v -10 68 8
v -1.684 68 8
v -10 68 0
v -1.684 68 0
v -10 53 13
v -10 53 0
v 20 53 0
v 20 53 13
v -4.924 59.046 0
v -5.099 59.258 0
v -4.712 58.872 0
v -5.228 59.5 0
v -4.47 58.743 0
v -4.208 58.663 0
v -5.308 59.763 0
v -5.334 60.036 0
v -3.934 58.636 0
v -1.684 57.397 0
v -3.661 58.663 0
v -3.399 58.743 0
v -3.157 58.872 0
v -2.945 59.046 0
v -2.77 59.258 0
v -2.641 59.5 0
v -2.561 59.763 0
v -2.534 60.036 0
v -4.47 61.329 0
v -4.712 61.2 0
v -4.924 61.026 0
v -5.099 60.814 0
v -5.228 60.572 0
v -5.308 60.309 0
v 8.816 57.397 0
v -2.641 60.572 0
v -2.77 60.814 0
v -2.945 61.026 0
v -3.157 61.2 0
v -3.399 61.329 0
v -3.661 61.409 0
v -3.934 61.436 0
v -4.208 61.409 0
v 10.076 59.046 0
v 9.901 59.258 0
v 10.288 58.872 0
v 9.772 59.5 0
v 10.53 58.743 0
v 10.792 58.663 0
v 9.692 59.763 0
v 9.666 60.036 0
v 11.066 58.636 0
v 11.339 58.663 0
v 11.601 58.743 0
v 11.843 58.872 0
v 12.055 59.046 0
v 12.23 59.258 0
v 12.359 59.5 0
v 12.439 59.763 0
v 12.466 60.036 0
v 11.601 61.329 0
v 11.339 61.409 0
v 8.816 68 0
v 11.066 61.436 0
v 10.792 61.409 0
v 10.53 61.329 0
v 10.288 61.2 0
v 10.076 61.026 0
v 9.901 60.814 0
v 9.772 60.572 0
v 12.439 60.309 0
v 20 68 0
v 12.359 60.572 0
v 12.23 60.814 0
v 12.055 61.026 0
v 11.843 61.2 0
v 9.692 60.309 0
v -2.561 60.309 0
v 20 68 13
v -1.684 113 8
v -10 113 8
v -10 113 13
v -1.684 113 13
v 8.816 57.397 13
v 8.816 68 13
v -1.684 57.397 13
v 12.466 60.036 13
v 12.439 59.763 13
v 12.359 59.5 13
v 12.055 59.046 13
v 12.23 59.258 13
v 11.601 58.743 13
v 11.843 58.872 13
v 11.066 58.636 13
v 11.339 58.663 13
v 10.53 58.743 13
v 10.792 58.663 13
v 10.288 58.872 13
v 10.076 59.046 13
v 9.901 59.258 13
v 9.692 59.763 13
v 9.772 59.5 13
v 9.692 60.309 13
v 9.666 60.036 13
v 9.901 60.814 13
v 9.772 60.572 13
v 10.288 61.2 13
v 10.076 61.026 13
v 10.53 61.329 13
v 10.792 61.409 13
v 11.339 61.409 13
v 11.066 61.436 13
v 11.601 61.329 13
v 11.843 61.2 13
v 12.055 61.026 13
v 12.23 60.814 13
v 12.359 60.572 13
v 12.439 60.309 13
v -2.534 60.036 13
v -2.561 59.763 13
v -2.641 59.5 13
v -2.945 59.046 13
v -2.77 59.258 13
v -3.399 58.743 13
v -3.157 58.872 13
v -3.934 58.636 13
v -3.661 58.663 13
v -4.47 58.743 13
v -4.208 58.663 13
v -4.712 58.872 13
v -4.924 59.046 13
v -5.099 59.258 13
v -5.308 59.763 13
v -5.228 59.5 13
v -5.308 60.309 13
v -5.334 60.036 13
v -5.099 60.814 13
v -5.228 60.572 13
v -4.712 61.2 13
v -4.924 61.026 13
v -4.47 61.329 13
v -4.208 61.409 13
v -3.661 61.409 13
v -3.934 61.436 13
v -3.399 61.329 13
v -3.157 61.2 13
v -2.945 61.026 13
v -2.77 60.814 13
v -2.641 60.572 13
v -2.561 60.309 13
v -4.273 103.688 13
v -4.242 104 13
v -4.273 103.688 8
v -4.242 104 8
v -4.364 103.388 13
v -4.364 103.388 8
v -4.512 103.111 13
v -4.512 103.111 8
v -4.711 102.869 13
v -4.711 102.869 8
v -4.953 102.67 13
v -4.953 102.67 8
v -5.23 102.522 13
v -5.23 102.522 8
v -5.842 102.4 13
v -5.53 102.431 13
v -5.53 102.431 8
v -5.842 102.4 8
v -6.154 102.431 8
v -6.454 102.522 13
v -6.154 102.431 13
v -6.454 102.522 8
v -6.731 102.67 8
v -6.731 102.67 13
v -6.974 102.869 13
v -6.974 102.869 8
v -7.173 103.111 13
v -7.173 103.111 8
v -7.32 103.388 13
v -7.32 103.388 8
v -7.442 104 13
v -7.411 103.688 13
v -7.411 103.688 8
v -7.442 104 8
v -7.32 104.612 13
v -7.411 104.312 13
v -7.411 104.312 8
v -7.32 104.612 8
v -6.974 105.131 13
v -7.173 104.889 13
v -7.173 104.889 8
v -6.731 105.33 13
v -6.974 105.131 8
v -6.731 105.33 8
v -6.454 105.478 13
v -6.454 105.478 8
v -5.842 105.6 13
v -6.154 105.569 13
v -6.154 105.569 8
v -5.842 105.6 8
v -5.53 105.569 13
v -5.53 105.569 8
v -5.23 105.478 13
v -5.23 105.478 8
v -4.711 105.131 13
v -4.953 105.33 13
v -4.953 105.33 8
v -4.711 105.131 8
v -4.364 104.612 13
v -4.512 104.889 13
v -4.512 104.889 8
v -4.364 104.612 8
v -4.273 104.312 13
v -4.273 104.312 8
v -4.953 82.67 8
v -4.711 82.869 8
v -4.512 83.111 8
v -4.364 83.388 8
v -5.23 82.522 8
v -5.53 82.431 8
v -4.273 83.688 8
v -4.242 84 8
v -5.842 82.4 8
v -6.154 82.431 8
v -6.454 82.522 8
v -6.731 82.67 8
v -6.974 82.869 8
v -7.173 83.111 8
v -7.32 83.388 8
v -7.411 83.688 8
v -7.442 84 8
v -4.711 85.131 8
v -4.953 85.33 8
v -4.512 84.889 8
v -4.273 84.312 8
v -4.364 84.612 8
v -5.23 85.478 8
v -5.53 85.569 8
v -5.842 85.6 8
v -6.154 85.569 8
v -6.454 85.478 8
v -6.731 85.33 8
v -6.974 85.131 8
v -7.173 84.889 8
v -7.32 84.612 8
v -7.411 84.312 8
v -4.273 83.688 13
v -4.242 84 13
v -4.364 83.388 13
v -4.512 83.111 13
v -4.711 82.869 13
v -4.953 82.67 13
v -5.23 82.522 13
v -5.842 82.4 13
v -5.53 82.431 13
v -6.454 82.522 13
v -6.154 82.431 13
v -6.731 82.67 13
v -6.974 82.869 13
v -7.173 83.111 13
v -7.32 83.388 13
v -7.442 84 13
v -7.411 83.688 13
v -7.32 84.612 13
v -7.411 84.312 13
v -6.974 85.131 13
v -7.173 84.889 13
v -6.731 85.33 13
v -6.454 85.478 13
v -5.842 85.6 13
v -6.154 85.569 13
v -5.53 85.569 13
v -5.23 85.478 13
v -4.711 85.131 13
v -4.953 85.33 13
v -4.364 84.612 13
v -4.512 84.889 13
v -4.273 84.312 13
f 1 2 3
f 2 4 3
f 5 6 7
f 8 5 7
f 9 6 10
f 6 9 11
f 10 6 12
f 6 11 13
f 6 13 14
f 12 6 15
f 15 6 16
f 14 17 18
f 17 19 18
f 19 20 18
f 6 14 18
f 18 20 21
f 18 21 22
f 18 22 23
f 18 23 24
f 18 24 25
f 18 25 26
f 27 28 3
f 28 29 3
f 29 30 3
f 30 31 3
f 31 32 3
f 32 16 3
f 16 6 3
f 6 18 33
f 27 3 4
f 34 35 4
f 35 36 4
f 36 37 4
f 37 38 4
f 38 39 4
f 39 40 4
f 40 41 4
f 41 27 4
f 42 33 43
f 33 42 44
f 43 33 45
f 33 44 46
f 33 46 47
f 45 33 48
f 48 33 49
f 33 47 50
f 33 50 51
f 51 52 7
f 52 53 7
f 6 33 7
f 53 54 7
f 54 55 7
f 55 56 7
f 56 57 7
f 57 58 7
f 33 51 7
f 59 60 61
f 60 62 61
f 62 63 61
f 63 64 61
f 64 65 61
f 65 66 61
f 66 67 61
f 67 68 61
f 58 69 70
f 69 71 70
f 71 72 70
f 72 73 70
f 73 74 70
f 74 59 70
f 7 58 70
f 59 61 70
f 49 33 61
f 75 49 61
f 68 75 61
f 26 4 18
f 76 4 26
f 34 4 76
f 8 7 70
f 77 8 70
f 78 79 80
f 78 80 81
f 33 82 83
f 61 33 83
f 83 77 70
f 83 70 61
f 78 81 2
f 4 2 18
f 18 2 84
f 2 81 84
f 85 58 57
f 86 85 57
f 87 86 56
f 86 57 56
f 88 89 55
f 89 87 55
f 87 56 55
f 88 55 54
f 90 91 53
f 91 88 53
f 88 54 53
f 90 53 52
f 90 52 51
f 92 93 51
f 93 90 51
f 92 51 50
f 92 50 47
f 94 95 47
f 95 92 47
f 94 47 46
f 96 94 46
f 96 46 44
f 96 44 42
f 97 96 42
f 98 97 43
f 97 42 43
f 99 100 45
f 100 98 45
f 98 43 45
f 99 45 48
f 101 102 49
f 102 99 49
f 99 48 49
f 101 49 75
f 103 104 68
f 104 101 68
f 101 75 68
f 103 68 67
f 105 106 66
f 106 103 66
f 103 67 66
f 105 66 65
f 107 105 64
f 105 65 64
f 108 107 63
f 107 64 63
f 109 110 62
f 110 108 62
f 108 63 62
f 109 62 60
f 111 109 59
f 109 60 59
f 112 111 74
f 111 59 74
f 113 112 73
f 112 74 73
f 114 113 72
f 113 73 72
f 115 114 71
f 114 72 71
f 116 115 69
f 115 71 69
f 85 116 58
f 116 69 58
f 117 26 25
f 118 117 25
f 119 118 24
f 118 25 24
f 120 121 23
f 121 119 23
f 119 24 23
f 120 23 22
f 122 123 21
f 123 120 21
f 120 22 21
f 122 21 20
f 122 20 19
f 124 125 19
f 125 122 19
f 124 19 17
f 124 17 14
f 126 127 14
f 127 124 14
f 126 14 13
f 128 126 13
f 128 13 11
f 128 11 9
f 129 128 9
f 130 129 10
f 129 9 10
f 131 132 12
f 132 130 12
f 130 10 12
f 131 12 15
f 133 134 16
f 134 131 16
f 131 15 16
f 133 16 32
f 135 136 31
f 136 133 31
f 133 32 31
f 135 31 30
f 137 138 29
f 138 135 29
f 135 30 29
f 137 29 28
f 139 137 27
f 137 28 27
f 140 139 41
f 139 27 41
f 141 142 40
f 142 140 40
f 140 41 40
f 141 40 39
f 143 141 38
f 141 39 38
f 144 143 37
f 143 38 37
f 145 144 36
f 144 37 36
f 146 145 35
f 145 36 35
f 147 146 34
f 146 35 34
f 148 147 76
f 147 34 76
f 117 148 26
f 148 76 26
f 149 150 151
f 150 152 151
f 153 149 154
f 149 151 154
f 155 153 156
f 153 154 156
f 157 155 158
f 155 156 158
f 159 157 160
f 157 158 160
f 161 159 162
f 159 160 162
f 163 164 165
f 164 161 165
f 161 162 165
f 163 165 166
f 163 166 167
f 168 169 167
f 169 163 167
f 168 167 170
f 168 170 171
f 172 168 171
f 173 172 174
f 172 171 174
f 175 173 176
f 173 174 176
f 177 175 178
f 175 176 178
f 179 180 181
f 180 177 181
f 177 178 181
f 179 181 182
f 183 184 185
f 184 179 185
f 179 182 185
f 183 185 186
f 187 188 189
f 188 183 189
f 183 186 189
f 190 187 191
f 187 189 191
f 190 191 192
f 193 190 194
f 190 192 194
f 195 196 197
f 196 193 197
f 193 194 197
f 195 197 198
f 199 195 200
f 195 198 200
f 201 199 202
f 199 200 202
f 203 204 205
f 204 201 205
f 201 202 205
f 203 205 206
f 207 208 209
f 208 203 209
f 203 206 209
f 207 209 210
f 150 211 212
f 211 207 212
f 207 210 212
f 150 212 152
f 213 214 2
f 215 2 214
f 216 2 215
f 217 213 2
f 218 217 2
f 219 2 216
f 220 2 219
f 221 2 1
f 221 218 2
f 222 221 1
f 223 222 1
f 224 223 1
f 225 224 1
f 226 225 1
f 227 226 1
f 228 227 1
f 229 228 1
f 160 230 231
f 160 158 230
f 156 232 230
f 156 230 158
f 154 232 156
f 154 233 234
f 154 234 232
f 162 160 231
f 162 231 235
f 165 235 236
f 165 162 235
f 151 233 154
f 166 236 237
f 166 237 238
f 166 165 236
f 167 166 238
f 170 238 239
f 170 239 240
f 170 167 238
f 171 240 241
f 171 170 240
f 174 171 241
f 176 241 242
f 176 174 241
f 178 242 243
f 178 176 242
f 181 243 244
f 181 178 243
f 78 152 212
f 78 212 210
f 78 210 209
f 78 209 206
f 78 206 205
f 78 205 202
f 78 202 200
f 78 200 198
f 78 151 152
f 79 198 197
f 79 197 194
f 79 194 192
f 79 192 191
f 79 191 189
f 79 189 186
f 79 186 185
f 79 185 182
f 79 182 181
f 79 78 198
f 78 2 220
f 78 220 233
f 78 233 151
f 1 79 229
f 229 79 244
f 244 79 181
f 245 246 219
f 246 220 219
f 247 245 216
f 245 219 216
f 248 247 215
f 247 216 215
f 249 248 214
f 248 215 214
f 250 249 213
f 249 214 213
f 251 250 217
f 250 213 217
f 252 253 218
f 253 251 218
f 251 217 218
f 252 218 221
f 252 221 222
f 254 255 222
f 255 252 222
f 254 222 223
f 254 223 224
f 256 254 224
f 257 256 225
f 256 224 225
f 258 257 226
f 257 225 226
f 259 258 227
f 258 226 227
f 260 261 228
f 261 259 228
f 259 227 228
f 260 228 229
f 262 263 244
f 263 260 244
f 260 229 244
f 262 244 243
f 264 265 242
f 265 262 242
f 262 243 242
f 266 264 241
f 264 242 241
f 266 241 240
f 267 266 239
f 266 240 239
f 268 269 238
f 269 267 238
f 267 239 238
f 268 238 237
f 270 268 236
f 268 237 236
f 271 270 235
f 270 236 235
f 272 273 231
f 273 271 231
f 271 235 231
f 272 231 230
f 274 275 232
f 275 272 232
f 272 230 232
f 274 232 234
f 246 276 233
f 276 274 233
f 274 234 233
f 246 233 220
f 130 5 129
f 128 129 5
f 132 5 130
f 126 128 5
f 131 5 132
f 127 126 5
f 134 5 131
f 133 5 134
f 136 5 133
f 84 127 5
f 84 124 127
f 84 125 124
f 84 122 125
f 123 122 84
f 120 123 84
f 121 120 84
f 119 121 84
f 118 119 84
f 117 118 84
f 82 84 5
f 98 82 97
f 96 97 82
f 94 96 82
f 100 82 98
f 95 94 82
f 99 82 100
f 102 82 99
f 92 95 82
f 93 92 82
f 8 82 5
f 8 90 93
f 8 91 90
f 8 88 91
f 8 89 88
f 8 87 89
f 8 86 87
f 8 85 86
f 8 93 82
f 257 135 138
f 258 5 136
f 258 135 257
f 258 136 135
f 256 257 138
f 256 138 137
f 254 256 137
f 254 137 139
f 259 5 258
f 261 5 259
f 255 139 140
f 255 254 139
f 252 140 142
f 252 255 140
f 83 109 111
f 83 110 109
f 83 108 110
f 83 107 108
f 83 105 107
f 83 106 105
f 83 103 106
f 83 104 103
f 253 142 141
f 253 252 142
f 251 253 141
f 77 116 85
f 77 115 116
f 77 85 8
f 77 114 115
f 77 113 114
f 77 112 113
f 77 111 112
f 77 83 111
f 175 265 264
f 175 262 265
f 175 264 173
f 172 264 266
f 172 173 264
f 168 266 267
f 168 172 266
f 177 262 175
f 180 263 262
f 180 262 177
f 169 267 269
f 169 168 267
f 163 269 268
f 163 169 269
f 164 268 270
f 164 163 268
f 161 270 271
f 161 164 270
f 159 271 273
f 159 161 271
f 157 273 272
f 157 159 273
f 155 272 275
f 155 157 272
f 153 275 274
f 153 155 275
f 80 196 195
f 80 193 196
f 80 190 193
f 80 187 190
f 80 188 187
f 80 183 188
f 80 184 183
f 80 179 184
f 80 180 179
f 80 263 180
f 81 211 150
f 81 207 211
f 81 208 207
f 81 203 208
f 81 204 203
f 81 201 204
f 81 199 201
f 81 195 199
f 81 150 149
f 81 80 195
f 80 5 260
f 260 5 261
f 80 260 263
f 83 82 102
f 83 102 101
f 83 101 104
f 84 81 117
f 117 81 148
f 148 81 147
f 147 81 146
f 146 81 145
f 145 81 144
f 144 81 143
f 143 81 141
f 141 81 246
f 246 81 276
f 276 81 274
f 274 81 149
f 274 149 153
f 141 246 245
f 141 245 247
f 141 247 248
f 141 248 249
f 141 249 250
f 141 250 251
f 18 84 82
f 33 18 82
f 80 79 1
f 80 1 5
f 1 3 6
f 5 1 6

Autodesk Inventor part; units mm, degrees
ref_plane "YZ Plane" through (0, 0, 0) normal (1, 0, 0) x (0, 1, 0)
ref_plane "XZ Plane" through (0, 0, 0) normal (0, 1, 0) x (-1, 0, 0)
ref_plane "XY Plane" through (0, 0, 0) normal (0, 0, 1) x (1, 0, 0)
ref_plane "Arbeitsebene1" through (0, 0, 0) normal (0, 0, 1) x (1, 0, 0)
sketch "Skizze1" plane through (0, 0, 0) normal (0, 0, 1) x (1, 0, 0)
  line L0 (8.8004, 63) -> (20, 63)
  line L1 (20, 63) -> (20, 53)
  line L2 (8.8004, 63) -> (-10, 63)
  line L3 (-10, 63) -> (-10, 53)
  line L4 (-10, 53) -> (20, 53)
  circle A0 centre (-3.9345, 60.036) radius 1.4
  circle A1 centre (11.0655, 60.036) radius 1.4
  line L5 (-10, 63) -> (20, 63)
  line L6 (20, 63) -> (20, 68)
  line L7 (20, 68) -> (-10, 68)
  line L8 (-10, 68) -> (-10, 63)
  point P0 (12.8, 45.75)
  point P1 (12.8, 36.25)
  dimension "d11" = 30
  dimension "d14" = 10
  dimension "d16" = 2.8
  dimension "d17" = 2.8
  dimension "d18" = 15
  dimension "d19" = 0
  dimension "d20" = 5
extrude "Extrusion1" add sketch "Skizze1" along normal blind 5
sketch "Skizze4" plane through (0, 0, 5) normal (0, 0, 1) x (1, 0, 0)
  line L0 (20, 68) -> (-10, 68) projected
  line L1 (-10, 68) -> (-10, 53) projected
  line L2 (-10, 53) -> (20, 53) projected
  circle A0 centre (-3.9345, 60.036) radius 1.4 projected
  circle A1 centre (11.0655, 60.036) radius 1.4 projected
  line L3 (-1.6845, 57.3969) -> (8.8155, 57.3969)
  line L4 (8.8155, 57.3969) -> (8.8155, 70.8506)
  line L5 (8.8155, 70.8506) -> (-1.6845, 70.8506)
  line L6 (-1.6845, 70.8506) -> (-1.6845, 57.3969)
  line L7 (20, 53) -> (20, 68) projected
  point P0 (0, 0)
  point P1 (8.8155, 68)
  point P2 (-1.6845, 68)
  dimension "d21" = 10.5
  dimension "d22" = 2.25
extrude "Extrusion3" cut sketch "Skizze4" against normal blind 5 contours L4 L3 L6 L0
sketch "Skizze5" plane through (0, 0, 5) normal (0, 0, 1) x (1, 0, 0)
  line L0 (-1.6845, 57.3969) -> (-1.6845, 68) projected
  line L1 (-1.6845, 68) -> (-10, 68) projected
  line L2 (-10, 68) -> (-10, 53) projected
  line L3 (-10, 53) -> (20, 53) projected
  line L4 (20, 53) -> (20, 68) projected
  line L5 (20, 68) -> (8.8155, 68) projected
  line L6 (8.8155, 68) -> (8.8155, 57.3969) projected
  line L7 (8.8155, 57.3969) -> (-1.6845, 57.3969) projected
  circle A0 centre (11.0655, 60.036) radius 1.4 projected
  circle A1 centre (-3.9345, 60.036) radius 1.4 projected
  line L8 (-1.6845, 53) -> (-10, 53)
  line L9 (-10, 53) -> (-10, 113)
  line L10 (-10, 113) -> (-1.6845, 113)
  line L11 (-1.6845, 113) -> (-1.6845, 53)
  circle A2 centre (-5.8422, 84) radius 1.6
  circle A3 centre (-5.8422, 104) radius 1.6
  point P0 (0, 0)
  dimension "d26" = 45
  dimension "d27" = 3.2
  dimension "d28" = 3.2
  dimension "d29" = 20
  dimension "d30" = 16
extrude "Extrusion4" add sketch "Skizze5" along normal blind 8
sketch "Skizze6" plane through (0, 0, 5) normal (0, 0, -1) x (-1, 0, 0)
  line L0 (1.6845, 68) -> (10, 68) projected
  line L1 (10, 113) -> (10, 68) projected
  line L2 (1.6845, 113) -> (10, 113) projected
  line L3 (1.6845, 68) -> (1.6845, 113) projected
  circle A0 centre (5.8422, 104) radius 1.6 projected
  circle A1 centre (5.8422, 84) radius 1.6 projected
  line L4 (1.6845, 68) -> (10, 68)
  line L5 (10, 68) -> (10, 113)
  line L6 (10, 113) -> (1.6845, 113)
  line L7 (1.6845, 113) -> (1.6845, 68)
  point P0 (0, 0)
extrude "Extrusion5" cut sketch "Skizze6" against normal blind 3
properties part number "30_XYTable_Aliexpress_naked_endstopX_adapter"
